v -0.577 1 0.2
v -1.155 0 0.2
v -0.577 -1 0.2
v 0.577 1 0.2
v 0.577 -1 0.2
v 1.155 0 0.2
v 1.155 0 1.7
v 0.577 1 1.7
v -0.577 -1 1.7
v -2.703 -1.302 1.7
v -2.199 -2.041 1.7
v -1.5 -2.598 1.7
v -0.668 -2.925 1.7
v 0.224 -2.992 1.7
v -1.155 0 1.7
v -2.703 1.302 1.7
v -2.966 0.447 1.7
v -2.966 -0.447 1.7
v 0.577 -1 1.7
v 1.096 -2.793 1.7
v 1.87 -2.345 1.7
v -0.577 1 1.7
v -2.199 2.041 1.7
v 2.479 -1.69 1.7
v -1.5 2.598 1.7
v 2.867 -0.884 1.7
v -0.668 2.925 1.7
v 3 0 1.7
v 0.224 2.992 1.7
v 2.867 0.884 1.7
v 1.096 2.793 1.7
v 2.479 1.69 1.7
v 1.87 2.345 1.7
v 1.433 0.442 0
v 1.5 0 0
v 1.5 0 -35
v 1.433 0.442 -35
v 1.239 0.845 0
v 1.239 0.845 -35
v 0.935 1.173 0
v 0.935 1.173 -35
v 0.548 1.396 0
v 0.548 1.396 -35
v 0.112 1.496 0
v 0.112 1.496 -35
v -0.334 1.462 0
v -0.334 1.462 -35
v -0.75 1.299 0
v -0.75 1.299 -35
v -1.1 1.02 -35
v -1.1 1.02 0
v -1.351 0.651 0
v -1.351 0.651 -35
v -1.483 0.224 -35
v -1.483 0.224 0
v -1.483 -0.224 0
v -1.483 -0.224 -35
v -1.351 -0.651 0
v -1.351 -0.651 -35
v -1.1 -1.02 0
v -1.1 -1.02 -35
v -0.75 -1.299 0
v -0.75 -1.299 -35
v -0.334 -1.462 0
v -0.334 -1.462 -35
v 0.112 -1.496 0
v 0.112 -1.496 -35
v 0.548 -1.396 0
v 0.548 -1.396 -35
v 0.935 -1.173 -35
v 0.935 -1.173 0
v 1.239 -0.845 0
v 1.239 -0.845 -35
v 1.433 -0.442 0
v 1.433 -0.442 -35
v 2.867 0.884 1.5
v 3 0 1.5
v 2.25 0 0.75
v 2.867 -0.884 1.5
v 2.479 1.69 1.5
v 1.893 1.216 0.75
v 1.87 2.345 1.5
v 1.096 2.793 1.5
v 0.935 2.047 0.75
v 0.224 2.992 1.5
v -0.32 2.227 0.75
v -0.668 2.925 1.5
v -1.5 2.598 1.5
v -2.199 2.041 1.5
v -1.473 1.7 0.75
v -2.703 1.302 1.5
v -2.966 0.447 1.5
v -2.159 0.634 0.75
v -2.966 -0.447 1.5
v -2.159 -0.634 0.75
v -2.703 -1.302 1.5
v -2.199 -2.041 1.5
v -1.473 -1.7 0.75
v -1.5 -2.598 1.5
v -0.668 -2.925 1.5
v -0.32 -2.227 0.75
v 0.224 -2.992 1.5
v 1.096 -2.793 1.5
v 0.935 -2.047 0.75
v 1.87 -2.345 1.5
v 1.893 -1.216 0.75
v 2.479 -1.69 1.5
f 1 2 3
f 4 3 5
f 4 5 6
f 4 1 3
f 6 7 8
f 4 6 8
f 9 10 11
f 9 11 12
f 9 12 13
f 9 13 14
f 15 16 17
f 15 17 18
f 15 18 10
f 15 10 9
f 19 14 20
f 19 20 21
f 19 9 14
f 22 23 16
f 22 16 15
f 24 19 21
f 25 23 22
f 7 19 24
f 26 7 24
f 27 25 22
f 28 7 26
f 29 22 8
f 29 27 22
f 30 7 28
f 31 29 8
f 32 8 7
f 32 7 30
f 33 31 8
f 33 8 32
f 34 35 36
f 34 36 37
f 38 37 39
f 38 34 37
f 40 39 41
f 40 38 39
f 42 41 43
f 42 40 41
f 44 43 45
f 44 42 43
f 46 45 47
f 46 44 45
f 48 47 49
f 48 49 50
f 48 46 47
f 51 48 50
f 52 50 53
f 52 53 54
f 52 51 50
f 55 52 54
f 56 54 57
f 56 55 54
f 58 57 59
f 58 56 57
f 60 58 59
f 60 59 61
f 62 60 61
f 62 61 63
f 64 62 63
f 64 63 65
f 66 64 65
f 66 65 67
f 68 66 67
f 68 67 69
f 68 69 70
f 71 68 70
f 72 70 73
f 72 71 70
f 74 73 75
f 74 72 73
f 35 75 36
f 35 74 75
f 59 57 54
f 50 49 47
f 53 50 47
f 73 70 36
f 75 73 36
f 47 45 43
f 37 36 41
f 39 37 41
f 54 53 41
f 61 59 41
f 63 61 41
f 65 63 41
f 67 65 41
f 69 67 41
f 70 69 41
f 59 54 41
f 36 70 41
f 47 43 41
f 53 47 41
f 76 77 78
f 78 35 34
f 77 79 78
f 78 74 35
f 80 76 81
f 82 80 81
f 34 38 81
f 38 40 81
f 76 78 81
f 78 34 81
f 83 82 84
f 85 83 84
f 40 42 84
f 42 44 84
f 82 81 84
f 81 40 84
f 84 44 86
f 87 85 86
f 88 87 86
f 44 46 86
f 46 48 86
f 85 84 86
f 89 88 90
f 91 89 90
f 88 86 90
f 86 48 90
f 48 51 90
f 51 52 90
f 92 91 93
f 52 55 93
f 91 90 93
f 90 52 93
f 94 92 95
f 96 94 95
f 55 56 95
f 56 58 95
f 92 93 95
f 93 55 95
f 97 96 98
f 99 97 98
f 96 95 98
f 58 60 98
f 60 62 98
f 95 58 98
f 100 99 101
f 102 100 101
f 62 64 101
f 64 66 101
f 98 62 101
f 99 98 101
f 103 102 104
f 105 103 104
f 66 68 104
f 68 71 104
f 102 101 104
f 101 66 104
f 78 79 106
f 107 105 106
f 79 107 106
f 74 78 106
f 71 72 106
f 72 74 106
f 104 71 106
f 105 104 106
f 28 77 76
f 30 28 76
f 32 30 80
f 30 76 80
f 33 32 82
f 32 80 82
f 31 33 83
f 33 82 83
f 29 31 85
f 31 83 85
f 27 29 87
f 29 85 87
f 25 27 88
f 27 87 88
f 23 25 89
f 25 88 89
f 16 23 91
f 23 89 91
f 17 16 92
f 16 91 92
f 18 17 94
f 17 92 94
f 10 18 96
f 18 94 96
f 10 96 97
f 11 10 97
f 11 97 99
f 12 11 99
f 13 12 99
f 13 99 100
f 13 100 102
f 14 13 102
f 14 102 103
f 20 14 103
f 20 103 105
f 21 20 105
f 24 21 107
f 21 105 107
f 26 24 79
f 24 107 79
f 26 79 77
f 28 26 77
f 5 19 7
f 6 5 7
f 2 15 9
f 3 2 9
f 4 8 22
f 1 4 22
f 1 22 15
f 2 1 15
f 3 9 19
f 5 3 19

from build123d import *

# Parameters (mm, degrees)
F0_R     = 1.5
F1_DEPTH = 35
F0_R_2   = 3
F2_DEPTH = 1.7
F4_DEPTH = 1.5
F5_SIZE  = 1.49999


# Not quite as in the source:
# - a fillet or chamfer is up to 0.001 mm smaller than in the source, because OpenCascade refuses the exact size


with BuildPart() as f1:
    # F0 (on Top) → F1 (new body)
    with BuildSketch(Plane.XY):
        Circle(F0_R)
    extrude(amount=-F1_DEPTH)

    # F0 (on Top) → F2 (join)
    with BuildSketch(Plane.XY):
        Circle(F0_R_2)
        Circle(F0_R, mode=Mode.SUBTRACT)
        Circle(F0_R)
    extrude(amount=F2_DEPTH)

    # F3 (on face) → F4 (cut)
    with BuildSketch(Plane.XY.offset(1.7)):
        Polygon((-0.5773502692, -1), (0.5773502692, -1), (1.1547005384, 0), (0.5773502692, 1), (-0.5773502692, 1), (-1.1547005384, 0), align=None)
    extrude(amount=-F4_DEPTH, mode=Mode.SUBTRACT)

    # F5 (size 1.5 in the source; OpenCascade refuses exactly that, so slightly less here)
    f5_edges = [f1.edges().sort_by_distance(p)[0] for p in [
        (-3, 0, 0),
    ]]
    chamfer(f5_edges, length=F5_SIZE)


solid = f1.part
